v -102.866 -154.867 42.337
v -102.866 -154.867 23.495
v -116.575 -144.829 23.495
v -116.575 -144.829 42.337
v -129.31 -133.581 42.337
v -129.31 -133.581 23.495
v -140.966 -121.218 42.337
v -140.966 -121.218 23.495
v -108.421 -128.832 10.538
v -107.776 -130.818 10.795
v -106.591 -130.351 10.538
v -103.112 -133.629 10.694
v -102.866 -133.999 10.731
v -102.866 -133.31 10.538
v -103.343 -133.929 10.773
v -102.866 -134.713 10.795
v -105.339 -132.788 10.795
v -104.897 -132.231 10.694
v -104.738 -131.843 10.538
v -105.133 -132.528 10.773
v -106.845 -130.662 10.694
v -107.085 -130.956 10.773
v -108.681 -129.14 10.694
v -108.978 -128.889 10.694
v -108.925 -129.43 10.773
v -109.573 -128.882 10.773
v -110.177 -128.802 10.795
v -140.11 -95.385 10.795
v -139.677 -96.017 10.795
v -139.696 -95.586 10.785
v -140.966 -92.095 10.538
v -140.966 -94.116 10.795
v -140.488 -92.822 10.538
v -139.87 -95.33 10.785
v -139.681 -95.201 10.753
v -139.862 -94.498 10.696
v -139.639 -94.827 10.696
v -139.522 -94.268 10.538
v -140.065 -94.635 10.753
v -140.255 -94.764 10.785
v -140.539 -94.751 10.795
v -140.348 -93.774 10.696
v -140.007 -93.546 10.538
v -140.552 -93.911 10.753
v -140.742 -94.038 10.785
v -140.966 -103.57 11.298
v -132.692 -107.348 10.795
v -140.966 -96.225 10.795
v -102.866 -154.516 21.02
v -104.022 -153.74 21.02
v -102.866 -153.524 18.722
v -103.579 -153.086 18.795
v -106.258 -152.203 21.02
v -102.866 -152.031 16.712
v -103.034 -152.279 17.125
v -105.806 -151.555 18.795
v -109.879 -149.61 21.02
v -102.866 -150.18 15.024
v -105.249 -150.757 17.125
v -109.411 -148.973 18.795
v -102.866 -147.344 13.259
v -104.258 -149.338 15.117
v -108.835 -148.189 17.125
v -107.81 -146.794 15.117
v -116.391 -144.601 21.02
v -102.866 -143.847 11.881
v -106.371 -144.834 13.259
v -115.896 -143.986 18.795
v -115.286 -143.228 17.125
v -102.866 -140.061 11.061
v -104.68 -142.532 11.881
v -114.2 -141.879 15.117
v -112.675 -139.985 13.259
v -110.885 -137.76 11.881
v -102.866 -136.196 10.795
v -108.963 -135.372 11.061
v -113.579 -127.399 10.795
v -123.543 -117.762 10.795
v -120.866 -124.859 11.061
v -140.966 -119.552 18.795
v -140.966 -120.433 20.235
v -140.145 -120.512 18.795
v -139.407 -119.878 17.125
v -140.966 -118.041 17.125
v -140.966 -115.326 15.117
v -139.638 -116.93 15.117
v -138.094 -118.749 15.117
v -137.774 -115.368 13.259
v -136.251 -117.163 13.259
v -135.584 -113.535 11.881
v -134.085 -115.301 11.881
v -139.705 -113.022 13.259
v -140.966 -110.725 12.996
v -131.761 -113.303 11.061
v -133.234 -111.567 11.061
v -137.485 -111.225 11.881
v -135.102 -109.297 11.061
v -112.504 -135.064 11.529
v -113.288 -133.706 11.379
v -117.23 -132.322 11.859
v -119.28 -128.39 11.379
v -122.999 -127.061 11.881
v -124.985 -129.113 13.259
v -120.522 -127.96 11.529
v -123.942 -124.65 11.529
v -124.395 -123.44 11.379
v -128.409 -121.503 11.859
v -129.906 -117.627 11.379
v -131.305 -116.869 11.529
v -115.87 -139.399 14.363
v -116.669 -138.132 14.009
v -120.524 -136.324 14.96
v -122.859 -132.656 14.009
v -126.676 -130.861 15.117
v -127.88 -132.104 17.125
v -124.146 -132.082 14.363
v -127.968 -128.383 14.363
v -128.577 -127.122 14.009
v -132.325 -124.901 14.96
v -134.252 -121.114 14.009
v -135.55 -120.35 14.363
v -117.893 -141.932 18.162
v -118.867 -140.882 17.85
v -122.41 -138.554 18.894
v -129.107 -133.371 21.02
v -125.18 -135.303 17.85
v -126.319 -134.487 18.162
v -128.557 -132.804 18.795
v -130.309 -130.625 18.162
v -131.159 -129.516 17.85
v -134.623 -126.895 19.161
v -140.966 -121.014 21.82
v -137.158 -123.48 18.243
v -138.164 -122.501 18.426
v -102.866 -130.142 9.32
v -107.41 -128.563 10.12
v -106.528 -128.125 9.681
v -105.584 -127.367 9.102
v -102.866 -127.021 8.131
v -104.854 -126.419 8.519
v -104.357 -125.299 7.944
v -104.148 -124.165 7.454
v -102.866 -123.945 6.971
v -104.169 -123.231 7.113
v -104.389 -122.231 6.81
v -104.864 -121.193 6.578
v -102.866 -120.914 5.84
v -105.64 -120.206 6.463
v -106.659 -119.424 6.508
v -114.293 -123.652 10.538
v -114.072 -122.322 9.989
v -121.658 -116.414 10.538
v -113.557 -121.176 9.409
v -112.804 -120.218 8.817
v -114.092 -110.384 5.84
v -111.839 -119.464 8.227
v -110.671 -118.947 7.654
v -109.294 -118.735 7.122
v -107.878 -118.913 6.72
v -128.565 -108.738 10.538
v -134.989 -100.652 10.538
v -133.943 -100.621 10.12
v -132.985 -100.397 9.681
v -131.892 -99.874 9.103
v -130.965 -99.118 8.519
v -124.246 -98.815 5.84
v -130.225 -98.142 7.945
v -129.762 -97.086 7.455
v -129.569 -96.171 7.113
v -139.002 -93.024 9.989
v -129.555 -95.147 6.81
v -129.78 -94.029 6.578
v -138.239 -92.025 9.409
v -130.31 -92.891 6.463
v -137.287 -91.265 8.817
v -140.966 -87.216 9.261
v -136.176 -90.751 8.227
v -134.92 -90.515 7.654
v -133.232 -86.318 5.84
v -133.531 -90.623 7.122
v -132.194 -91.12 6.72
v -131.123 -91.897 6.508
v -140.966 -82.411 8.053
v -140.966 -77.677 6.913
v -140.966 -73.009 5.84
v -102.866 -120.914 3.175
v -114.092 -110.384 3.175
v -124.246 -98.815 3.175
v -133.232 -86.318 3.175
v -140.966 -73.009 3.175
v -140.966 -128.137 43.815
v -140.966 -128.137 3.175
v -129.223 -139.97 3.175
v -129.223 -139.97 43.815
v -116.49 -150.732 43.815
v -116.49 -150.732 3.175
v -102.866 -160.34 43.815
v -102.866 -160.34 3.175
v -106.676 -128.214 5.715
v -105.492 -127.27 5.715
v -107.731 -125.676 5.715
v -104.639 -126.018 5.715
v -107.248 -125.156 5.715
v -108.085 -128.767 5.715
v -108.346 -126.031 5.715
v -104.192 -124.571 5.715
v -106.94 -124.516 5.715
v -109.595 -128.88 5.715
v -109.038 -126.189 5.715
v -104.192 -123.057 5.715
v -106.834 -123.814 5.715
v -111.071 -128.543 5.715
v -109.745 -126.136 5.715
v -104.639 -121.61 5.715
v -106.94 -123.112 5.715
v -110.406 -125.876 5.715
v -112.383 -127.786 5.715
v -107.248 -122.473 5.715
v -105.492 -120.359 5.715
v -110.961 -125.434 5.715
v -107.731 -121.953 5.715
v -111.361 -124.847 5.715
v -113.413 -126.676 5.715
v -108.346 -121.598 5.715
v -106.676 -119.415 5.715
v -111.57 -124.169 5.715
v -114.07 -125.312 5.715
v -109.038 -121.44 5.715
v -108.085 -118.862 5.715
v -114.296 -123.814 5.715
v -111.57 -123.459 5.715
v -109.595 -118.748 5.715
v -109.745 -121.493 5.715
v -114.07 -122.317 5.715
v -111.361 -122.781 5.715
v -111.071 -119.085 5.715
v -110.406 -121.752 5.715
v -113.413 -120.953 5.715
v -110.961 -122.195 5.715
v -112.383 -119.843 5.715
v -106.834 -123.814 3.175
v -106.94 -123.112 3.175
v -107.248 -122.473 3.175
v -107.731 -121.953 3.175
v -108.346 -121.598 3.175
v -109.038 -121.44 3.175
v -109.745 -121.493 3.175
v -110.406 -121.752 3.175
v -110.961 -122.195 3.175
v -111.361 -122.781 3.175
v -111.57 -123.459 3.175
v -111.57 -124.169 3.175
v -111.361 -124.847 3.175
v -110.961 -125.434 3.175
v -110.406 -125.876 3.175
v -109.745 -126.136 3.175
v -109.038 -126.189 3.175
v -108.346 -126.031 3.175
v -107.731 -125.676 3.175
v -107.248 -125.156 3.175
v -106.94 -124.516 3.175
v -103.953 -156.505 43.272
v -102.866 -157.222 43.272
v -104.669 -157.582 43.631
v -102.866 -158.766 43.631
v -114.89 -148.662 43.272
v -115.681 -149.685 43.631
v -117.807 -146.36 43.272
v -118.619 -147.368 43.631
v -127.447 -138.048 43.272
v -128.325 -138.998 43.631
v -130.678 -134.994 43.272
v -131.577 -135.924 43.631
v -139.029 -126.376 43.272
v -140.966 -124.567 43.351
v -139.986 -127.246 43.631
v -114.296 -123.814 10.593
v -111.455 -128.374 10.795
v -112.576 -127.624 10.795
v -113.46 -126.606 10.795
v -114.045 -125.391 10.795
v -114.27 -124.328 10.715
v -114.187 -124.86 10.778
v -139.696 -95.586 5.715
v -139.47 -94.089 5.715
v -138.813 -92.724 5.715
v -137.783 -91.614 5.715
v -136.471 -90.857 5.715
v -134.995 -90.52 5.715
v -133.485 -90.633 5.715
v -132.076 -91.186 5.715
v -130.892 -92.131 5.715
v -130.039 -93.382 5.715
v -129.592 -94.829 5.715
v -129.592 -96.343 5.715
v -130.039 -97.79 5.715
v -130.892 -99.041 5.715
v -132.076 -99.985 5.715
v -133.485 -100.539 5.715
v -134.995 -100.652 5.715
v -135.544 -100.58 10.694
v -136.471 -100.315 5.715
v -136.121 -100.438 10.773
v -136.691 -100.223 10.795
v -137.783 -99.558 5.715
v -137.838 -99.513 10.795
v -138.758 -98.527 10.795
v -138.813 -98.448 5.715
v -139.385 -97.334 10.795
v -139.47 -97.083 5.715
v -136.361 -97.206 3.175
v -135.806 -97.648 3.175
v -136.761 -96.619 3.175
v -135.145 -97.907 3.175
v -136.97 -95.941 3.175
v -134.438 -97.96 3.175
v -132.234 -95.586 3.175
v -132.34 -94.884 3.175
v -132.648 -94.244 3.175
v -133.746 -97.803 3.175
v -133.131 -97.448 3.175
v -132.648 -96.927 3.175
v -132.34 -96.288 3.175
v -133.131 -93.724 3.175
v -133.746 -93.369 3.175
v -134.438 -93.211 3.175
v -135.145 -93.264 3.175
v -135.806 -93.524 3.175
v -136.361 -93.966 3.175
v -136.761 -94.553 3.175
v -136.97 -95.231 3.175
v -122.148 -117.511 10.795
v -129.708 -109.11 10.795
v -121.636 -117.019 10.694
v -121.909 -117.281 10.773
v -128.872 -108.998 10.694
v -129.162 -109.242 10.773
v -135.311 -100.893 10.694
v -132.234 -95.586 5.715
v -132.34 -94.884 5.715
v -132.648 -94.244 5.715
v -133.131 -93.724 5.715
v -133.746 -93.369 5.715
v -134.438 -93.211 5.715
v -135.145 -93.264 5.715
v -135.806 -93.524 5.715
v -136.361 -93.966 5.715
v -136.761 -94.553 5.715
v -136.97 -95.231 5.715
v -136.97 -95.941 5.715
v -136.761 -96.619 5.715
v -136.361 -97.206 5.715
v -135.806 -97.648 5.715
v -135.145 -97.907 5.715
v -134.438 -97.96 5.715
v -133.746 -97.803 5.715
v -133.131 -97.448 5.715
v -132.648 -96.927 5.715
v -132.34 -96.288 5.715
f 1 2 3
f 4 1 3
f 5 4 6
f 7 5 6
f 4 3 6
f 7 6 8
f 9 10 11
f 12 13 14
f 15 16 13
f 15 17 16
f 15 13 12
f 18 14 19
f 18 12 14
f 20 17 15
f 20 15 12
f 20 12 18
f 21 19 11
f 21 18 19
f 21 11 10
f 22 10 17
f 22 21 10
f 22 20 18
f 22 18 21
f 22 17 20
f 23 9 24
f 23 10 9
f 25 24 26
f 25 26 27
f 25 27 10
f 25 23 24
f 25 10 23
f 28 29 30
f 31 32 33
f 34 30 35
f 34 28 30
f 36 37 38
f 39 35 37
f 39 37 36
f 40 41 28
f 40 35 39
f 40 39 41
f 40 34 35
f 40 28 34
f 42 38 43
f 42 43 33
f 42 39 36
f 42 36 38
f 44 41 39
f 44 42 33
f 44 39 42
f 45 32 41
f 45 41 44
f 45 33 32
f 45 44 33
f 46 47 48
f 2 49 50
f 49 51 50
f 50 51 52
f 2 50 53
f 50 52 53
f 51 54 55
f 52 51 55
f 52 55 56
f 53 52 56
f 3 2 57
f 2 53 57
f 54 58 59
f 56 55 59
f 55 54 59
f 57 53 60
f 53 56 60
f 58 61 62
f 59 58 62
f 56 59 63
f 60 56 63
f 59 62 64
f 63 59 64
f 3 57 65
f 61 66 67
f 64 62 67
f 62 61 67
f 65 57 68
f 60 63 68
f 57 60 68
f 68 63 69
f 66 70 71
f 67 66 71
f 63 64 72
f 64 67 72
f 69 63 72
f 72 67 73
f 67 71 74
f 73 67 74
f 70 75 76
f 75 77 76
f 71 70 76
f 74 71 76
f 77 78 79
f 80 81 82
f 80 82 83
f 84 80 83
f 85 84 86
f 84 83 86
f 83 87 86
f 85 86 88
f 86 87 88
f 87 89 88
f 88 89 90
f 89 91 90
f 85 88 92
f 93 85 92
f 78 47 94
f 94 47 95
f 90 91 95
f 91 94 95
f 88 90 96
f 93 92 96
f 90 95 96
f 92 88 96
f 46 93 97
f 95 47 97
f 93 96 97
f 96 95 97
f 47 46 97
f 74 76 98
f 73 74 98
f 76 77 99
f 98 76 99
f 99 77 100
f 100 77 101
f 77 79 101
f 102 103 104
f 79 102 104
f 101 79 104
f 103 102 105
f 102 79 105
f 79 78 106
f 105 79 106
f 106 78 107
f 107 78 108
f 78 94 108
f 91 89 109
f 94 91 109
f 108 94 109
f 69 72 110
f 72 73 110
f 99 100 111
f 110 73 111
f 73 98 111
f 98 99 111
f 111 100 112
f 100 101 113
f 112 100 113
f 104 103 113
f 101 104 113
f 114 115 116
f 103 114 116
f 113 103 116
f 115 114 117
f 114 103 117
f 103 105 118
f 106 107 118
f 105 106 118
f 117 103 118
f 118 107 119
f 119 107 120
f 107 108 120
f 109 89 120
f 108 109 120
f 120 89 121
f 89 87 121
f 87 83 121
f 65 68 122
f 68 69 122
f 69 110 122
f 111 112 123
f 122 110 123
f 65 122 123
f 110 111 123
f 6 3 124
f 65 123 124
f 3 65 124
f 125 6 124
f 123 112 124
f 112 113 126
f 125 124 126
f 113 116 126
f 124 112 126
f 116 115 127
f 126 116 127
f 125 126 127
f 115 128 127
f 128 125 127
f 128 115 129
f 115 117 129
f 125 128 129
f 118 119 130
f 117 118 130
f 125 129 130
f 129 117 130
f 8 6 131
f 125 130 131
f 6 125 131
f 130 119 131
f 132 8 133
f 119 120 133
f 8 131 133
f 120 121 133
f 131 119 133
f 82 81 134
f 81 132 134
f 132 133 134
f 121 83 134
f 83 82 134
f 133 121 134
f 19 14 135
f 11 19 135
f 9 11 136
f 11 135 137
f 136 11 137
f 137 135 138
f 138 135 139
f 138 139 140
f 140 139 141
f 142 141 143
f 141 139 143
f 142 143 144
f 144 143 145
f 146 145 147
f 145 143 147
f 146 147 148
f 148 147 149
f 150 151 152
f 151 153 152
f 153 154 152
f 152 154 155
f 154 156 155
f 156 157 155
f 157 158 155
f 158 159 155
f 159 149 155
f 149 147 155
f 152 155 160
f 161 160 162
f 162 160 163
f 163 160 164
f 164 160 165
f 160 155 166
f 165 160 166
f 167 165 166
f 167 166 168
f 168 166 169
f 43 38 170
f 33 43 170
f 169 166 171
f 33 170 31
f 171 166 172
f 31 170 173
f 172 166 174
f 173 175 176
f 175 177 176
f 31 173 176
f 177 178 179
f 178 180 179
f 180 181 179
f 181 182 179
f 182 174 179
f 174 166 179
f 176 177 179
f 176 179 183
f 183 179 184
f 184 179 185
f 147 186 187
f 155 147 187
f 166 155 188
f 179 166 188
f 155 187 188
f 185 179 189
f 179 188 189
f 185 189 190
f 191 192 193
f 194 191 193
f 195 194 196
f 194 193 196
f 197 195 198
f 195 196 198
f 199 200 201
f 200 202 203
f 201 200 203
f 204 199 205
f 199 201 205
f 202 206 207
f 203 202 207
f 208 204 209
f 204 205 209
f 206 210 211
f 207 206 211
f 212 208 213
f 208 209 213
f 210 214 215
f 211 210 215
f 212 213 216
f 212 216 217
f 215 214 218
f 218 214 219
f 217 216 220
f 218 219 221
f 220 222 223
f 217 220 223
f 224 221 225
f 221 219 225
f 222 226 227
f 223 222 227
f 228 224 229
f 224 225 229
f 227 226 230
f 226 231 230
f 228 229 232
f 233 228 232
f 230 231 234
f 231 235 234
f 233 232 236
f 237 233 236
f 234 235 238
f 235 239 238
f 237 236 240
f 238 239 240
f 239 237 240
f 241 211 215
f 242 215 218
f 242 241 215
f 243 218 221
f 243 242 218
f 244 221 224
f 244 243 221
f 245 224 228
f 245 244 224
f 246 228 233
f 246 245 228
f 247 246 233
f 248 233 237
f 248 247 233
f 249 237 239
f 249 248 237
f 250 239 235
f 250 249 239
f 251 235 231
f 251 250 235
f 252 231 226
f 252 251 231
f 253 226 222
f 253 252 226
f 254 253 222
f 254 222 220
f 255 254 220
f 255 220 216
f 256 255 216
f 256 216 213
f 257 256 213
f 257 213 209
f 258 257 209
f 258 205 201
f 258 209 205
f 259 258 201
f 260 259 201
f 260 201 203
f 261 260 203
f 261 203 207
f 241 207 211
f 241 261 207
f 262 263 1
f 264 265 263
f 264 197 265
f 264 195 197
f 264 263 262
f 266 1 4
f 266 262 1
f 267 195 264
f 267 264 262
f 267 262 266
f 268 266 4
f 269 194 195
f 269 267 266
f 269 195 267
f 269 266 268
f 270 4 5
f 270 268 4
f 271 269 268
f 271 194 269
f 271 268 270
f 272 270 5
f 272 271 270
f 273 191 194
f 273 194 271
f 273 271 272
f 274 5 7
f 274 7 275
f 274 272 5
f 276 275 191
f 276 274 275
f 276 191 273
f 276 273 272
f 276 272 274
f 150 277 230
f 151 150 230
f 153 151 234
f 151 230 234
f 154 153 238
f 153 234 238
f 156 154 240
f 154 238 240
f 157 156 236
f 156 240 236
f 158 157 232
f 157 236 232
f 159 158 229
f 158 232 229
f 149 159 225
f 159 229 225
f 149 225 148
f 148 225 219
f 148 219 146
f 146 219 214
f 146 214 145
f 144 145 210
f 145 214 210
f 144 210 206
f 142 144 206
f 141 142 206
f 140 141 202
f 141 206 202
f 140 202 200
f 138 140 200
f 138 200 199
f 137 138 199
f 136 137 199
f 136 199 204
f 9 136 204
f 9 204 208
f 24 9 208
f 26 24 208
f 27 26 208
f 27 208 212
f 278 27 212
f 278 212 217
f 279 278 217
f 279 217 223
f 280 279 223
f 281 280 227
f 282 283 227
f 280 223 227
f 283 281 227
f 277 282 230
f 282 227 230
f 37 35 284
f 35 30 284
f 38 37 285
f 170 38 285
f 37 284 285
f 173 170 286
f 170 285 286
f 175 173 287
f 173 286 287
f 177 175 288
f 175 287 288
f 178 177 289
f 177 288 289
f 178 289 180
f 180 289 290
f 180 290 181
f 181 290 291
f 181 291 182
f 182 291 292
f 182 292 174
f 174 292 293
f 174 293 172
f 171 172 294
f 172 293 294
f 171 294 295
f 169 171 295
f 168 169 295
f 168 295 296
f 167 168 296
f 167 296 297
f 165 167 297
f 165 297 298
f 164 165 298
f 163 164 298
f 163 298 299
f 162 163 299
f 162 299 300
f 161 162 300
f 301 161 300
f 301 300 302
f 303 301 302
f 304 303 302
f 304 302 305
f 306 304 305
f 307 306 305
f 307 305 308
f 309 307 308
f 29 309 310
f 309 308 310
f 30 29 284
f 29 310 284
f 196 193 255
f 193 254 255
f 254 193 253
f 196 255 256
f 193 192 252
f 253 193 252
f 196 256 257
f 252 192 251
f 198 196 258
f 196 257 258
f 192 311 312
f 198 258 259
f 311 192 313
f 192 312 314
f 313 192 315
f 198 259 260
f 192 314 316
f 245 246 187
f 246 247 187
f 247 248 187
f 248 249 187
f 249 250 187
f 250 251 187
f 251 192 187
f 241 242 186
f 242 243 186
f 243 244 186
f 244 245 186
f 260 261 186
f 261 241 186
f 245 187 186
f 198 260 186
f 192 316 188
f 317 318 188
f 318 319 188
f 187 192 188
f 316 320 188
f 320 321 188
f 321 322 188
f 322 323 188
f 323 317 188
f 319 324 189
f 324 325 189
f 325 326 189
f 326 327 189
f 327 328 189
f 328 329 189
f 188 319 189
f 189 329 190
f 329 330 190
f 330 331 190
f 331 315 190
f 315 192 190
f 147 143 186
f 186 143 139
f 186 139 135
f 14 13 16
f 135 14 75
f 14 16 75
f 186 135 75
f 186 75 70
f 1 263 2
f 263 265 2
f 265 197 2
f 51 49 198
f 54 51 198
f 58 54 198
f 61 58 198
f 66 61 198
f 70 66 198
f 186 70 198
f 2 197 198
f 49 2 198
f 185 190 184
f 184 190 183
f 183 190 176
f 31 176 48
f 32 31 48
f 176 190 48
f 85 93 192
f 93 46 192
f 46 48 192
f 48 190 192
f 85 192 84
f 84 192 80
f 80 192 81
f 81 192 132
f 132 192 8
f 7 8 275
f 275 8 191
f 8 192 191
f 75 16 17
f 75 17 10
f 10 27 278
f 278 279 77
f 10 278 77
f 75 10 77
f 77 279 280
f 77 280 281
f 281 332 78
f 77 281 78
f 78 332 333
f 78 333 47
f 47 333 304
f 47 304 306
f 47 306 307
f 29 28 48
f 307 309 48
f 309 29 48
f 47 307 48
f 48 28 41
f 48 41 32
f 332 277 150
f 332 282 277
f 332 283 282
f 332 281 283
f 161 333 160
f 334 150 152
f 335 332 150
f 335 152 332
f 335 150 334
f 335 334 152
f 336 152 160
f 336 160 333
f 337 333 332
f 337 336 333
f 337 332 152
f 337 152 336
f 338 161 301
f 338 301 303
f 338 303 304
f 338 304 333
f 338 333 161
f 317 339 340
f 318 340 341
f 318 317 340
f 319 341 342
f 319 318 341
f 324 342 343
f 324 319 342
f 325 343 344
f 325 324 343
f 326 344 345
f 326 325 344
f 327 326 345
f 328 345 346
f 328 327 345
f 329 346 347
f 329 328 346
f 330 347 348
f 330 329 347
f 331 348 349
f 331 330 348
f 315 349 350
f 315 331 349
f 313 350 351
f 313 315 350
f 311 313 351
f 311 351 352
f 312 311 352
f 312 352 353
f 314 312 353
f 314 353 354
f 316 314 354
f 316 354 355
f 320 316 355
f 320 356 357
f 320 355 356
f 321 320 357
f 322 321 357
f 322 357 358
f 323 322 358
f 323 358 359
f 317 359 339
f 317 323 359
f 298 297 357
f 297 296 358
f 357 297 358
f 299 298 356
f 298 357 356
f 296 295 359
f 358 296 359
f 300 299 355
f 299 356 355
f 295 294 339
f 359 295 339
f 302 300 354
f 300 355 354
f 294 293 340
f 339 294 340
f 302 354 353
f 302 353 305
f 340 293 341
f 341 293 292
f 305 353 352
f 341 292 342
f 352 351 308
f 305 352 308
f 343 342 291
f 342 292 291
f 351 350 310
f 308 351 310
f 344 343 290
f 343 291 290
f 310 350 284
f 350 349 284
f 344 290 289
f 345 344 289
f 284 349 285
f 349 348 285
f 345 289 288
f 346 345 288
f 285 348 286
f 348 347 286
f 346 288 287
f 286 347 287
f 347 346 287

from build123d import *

# Parameters (mm, degrees)
SKETCH1_R               = 2.38125
BOSS_EXTRUDE1_DEPTH     = 3.175
BOSS_EXTRUDE2_DEPTH     = 50.8
CUT_EXTRUDE1_DEPTH      = 209.526843613
CUT_EXTRUDE1_DEPTH_BACK = 209.526843613
SKETCH3_R               = 203.829254644
SKETCH3_R_2             = 174.625
SKETCH5_R               = 2.38125
CUT_EXTRUDE3_DEPTH      = 200.484174202
SKETCH6_W               = 205.731089426
SKETCH6_H               = 25.4
BOSS_EXTRUDE3_DEPTH     = 3.175
SKETCH8_R               = 2.38125
CUT_EXTRUDE5_DEPTH      = 200.484174202
SKETCH9_W               = 205.731089426
SKETCH9_H               = 38.1
BOSS_EXTRUDE4_DEPTH     = 3.175
SKETCH10_R              = 6.35
SKETCH10_R_2            = 2.38125
CUT_EXTRUDE6_DEPTH      = 200.484174202
SKETCH11_W              = 53.331089426
SKETCH11_H              = 31.75
BOSS_EXTRUDE5_DEPTH     = 3.175
FILLET1_R               = 10.16
SKETCH12_R              = 6.35
SKETCH12_R_2            = 2.38125
CUT_EXTRUDE7_DEPTH      = 200.484174202
FILLET2_R               = 2.54
CUT_EXTRUDE8_DEPTH      = 200.484174202
SKETCH14_W              = 2.759281453
SKETCH14_H              = 7.963584416
SKETCH14_W_2            = 2.527010149
SKETCH14_H_2            = 5.938870156
BOSS_EXTRUDE6_DEPTH     = 3.175
FILLET3_R               = 2.54
SKETCH15_R              = 2.38125
BOSS_EXTRUDE7_DEPTH     = 40.64
SKETCH16_R              = 227.754671792
SKETCH16_W              = 368.539826918
SKETCH16_H              = 147.114866813
CUT_EXTRUDE9_DEPTH      = 218.328838711
SKETCH17_R              = 87.195519402
CUT_EXTRUDE10_DEPTH     = 218.328838646
CHAMFER1_SIZE           = 27.94
CHAMFER1_SIZE_2         = 31.030513664
CUT_EXTRUDE12_START     = -2.54
SKETCH18_R              = 5.08
CUT_EXTRUDE12_DEPTH     = 33.02
FILLET4_R               = 10.16
CUT_EXTRUDE13_START     = -7.62
SKETCH20_R              = 185.916878671
CUT_EXTRUDE13_DEPTH     = 210.708838803
FILLET5_SIZE            = 12.7
FILLET5_SIZE_2          = 15.24
CHAMFER2_SIZE           = 10.16
CHAMFER2_SIZE_2         = 4.9553631
FILLET6_R               = 2.54


with BuildPart() as part:
    # Sketch1 → Boss-Extrude1 (new body)
    with BuildSketch(Plane.XY):
        with BuildLine():
            Line((-102.865544713, 31.75), (-102.865544713, 145.022480019))
            ThreePointArc((-102.865544713, 145.022480019), (-123.286100955, 128.114703728), (-140.965544713, 108.358457002))
            Line((-140.965544713, 108.358457002), (-140.965544713, -108.358457002))
            ThreePointArc((-140.965544713, -108.358457002), (-123.286100955, -128.114703728), (-102.865544713, -145.022480019))
            Line((-102.865544713, -145.022480019), (-102.865544713, -69.85))
            Line((-102.865544713, -69.85), (102.865544713, -69.85))
            Line((102.865544713, -69.85), (102.865544713, -145.022480019))
            ThreePointArc((102.865544713, -145.022480019), (123.286100955, -128.114703728), (140.965544713, -108.358457002))
            Line((140.965544713, -108.358457002), (140.965544713, 108.358457002))
            ThreePointArc((140.965544713, 108.358457002), (123.286100955, 128.114703728), (102.865544713, 145.022480019))
            Line((102.865544713, 145.022480019), (102.865544713, 31.75))
            Line((102.865544713, 31.75), (-102.865544713, 31.75))
        make_face()
        with Locations((25.4, -38.1)):
            Circle(SKETCH1_R, mode=Mode.SUBTRACT)
        with Locations((-25.4, -38.1)):
            Circle(SKETCH1_R, mode=Mode.SUBTRACT)
        with Locations((0, -38.1)):
            Circle(SKETCH1_R, mode=Mode.SUBTRACT)
    extrude(amount=BOSS_EXTRUDE1_DEPTH)

    # Sketch2 → Boss-Extrude2 (add)
    with BuildSketch(Plane.XY.offset(3.175)):
        with BuildLine():
            ThreePointArc((-102.865544713, -141.111907137), (-123.390730203, -123.566250752), (-140.965544713, -103.06602655))
            Line((-140.965544713, -103.06602655), (-140.965544713, -108.358457002))
            ThreePointArc((-140.965544713, -108.358457002), (-123.286100955, -128.114703728), (-102.865544713, -145.022480019))
            Line((-102.865544713, -145.022480019), (-102.865544713, -141.111907137))
        make_face()
        with BuildLine():
            ThreePointArc((140.965544713, -103.06602655), (123.390730203, -123.566250752), (102.865544713, -141.111907137))
            Line((102.865544713, -141.111907137), (102.865544713, -145.022480019))
            ThreePointArc((102.865544713, -145.022480019), (123.286100955, -128.114703728), (140.965544713, -108.358457002))
            Line((140.965544713, -108.358457002), (140.965544713, -103.06602655))
        make_face()
    extrude(amount=BOSS_EXTRUDE2_DEPTH)

    # Sketch3 → Cut-Extrude1 (cut, two sides: drawn at the far end of the back side and taken through both)
    with BuildSketch(Plane.XY.offset(3.175).offset(-CUT_EXTRUDE1_DEPTH_BACK)):
        Circle(SKETCH3_R)
        Circle(SKETCH3_R_2, mode=Mode.SUBTRACT)
    extrude(amount=CUT_EXTRUDE1_DEPTH + CUT_EXTRUDE1_DEPTH_BACK, mode=Mode.SUBTRACT)

    # Sketch5 → Cut-Extrude3 (cut, through all)
    with BuildSketch(Plane.XY.offset(3.175)):
        with Locations((134.615544713, -95.585904409)):
            Circle(SKETCH5_R)
        with Locations((109.215544713, -123.814275401)):
            Circle(SKETCH5_R)
        with Locations(Location((-134.615544713, -95.585904409, 0), (0, 0, 180))):
            Circle(SKETCH5_R)
        with Locations(Location((-109.215544713, -123.814275401, 0), (0, 0, 180))):
            Circle(SKETCH5_R)
    extrude(amount=-CUT_EXTRUDE3_DEPTH, mode=Mode.SUBTRACT)

    # Sketch6 → Boss-Extrude3 (add)
    with BuildSketch(Plane.XY.offset(3.175)):
        with Locations((0, 77.611907137)):
            Rectangle(SKETCH6_W, SKETCH6_H)
    extrude(amount=-BOSS_EXTRUDE3_DEPTH)

    # Sketch8 → Cut-Extrude5 (cut, through all)
    with BuildSketch(Plane.XY.offset(3.175)):
        with Locations((-38.1, -38.1)):
            Circle(SKETCH8_R)
        with Locations((-50.8, -38.1)):
            Circle(SKETCH8_R)
        with Locations((12.7, -38.1)):
            Circle(SKETCH8_R)
        with Locations((-12.7, -38.1)):
            Circle(SKETCH8_R)
    extrude(amount=-CUT_EXTRUDE5_DEPTH, mode=Mode.SUBTRACT)

    # Sketch9 → Boss-Extrude4 (add)
    with BuildSketch(Plane.XY.offset(3.175)):
        with Locations((0, -88.9)):
            Rectangle(SKETCH9_W, SKETCH9_H)
    extrude(amount=-BOSS_EXTRUDE4_DEPTH)

    # Sketch10 → Cut-Extrude6 (cut, through all)
    with BuildSketch(Plane.XY.offset(3.175)):
        with Locations((0, -76.2)):
            Circle(SKETCH10_R)
        with Locations((-25.4, -76.2)):
            Circle(SKETCH10_R_2)
        with Locations((-38.1, -76.2)):
            Circle(SKETCH10_R_2)
        with Locations((25.4, -76.2)):
            Circle(SKETCH10_R_2)
    extrude(amount=-CUT_EXTRUDE6_DEPTH, mode=Mode.SUBTRACT)

    # Sketch11 → Boss-Extrude5 (add)
    with BuildSketch(Plane.XY.offset(3.175)):
        with Locations((0, -123.825)):
            Rectangle(SKETCH11_W, SKETCH11_H)
    extrude(amount=-BOSS_EXTRUDE5_DEPTH)

    # Fillet1
    fillet1_edges = [part.edges().sort_by_distance(p)[0] for p in [
        (-26.665544713, -139.7, 1.5875),
        (-26.665544713, -107.95, 1.5875),
        (26.665544713, -107.95, 1.5875),
        (26.665544713, -139.7, 1.5875),
    ]]
    fillet(fillet1_edges, radius=FILLET1_R)

    # Sketch12 → Cut-Extrude7 (cut, through all)
    with BuildSketch(Plane.XY.offset(3.175)):
        with Locations((-25.4, -76.2)):
            Circle(SKETCH12_R)
        with Locations((25.4, -76.2)):
            Circle(SKETCH12_R)
        with Locations((-8.66775, -67.53225)):
            Circle(SKETCH12_R_2)
        with Locations((8.66775, -67.53225)):
            Circle(SKETCH12_R_2)
        with Locations((8.66775, -84.86775)):
            Circle(SKETCH12_R_2)
        with Locations((-8.66775, -84.86775)):
            Circle(SKETCH12_R_2)
    extrude(amount=-CUT_EXTRUDE7_DEPTH, mode=Mode.SUBTRACT)

    # Fillet2
    fillet2_edges = [part.edges().sort_by_distance(p)[0] for p in [
        (-102.865544713, 141.111907137, 1.5875),
        (102.865544713, 141.111907137, 1.5875),
    ]]
    fillet(fillet2_edges, radius=FILLET2_R)

    # Sketch13 → Cut-Extrude8 (cut, through all)
    # profile 1 of 4: a face of its own
    with BuildSketch(Plane.XY.offset(3.175)):
        with BuildLine():
            Line((-29.807958333, -15.810565048), (-38.216416667, -15.810565048))
            Line((-38.216416667, -15.810565048), (-33.538583333, 6.245101619))
            Line((-33.538583333, 6.245101619), (-38.803791667, 6.245101619))
            Line((-38.803791667, 6.245101619), (-39.682208333, 2.075268285))
            Line((-39.682208333, 2.075268285), (-48.095958333, 2.075268285))
            Line((-48.095958333, 2.075268285), (-47.397458333, 5.477809952))
            add(Edge.make_bspline(
                [(-47.397458333, 5.477809952), (-47.320569058, 5.758194134), (-47.170922216, 6.303895823), (-46.789013651, 7.053374007), (-46.29771223, 7.715065901), (-45.690436731, 8.272796577), (-45.006500067, 8.730292102), (-44.253147871, 9.054960677), (-43.448405111, 9.260244914), (-42.891974442, 9.282012228), (-42.6085, 9.293101619)],
                knots=[0, 0, 0, 0, 1.050168006, 2.043904372, 3.024673376, 4.01863537, 5.013909092, 5.989008141, 6.975497172, 8, 8, 8, 8], degree=3))
            Line((-42.6085, 9.293101619), (-24.463375, 9.293101619))
            Line((-24.463375, 9.293101619), (-29.807958333, -15.810565048))
        make_face()
    # profile 2 of 4: a face of its own
    with BuildSketch(Plane.XY.offset(3.175)):
        with BuildLine():
            add(Edge.make_bspline(
                [(-3.566583333, -12.132856715), (-3.643765668, -12.421811436), (-3.79437451, -12.985659844), (-4.17293599, -13.764550451), (-4.665381385, -14.453577746), (-5.270434906, -15.036263062), (-5.950809803, -15.518035961), (-6.703009887, -15.859816489), (-7.511777843, -16.068702787), (-8.070292693, -16.093985699), (-8.355541667, -16.106898381)],
                knots=[0, 0, 0, 0, 1.062369753, 2.073042759, 3.062499936, 4.061251344, 5.048575831, 6.014824268, 6.986115874, 8, 8, 8, 8], degree=3))
            Line((-8.355541667, -16.106898381), (-22.547791667, -16.106898381))
            add(Edge.make_bspline(
                [(-22.547791667, -16.106898381), (-22.69262218, -16.104596964), (-22.972752339, -16.100145578), (-23.378206431, -16.044702396), (-23.755568174, -15.960682303), (-24.107157142, -15.846746121), (-24.426210233, -15.691540895), (-24.716954418, -15.504453058), (-24.976786635, -15.281711317), (-25.203806964, -15.025677099), (-25.40308213, -14.746169713), (-25.554358436, -14.435544628), (-25.674211179, -14.106195373), (-25.74344938, -13.752832717), (-25.791514529, -13.37950469), (-25.77975916, -12.981941289), (-25.73922686, -12.562383844), (-25.682974686, -12.278883611), (-25.654, -12.132856715)],
                knots=[0, 0, 0, 0, 1.158779845, 2.241303809, 3.269110906, 4.251580925, 5.192683609, 6.101443689, 7.012833415, 7.922909267, 8.835720222, 9.751475912, 10.680528402, 11.633319635, 12.628295421, 13.687540584, 14.808885378, 16, 16, 16, 16], degree=3))
            Line((-25.654, -12.132856715), (-21.997458333, 5.319059952))
            add(Edge.make_bspline(
                [(-21.997458333, 5.319059952), (-21.920272116, 5.608009048), (-21.769655695, 6.171846477), (-21.391148554, 6.950815808), (-20.898502375, 7.639552216), (-20.293153244, 8.224337096), (-19.608609326, 8.702683082), (-18.855913228, 9.046275843), (-18.048644228, 9.254382857), (-17.4919553, 9.28003834), (-17.2085, 9.293101619)],
                knots=[0, 0, 0, 0, 1.062516124, 2.073328378, 3.062921881, 4.061810895, 5.05442655, 6.020808115, 6.992233544, 8, 8, 8, 8], degree=3))
            Line((-17.2085, 9.293101619), (-3.01625, 9.293101619))
            add(Edge.make_bspline(
                [(-3.01625, 9.293101619), (-2.871419505, 9.290800192), (-2.591289383, 9.286348788), (-2.185835038, 9.230905733), (-1.808474182, 9.146885197), (-1.456882118, 9.03295056), (-1.137839887, 8.877739913), (-0.847056821, 8.690671483), (-0.587369032, 8.467857656), (-0.359809395, 8.212092615), (-0.16209325, 7.930921186), (-0.002983257, 7.623293687), (0.114459046, 7.2921344), (0.187047795, 6.939473562), (0.223589985, 6.565305639), (0.223678302, 6.168188246), (0.179743785, 5.748571863), (0.123975462, 5.465081675), (0.09525, 5.319059952)],
                knots=[0, 0, 0, 0, 1.158432062, 2.24063113, 3.268129752, 4.250304904, 5.191125136, 6.099612471, 7.010728663, 7.920531375, 8.833068369, 9.75494936, 10.683723015, 11.636228288, 12.62940148, 13.688234619, 14.809242866, 16, 16, 16, 16], degree=3))
            Line((0.09525, 5.319059952), (-3.566583333, -12.132856715))
        make_face()
        Polygon((-13.403791667, 6.245101619), (-17.425458333, -13.058898381), (-12.16025, -13.058898381), (-8.138583333, 6.245101619), align=None, mode=Mode.SUBTRACT)
    # profile 3 of 4: a face of its own
    with BuildSketch(Plane.XY.offset(3.175)):
        with BuildLine():
            Line((11.557, 9.293101619), (8.556625, -5.269565048))
            Line((8.556625, -5.269565048), (13.827125, -5.269565048))
            Line((13.827125, -5.269565048), (16.8275, 9.293101619))
            Line((16.8275, 9.293101619), (25.235958333, 9.293101619))
            Line((25.235958333, 9.293101619), (19.896666667, -16.106898381))
            Line((19.896666667, -16.106898381), (11.482916667, -16.106898381))
            Line((11.482916667, -16.106898381), (13.165666667, -8.317565048))
            Line((13.165666667, -8.317565048), (3.439583333, -8.317565048))
            add(Edge.make_bspline(
                [(3.439583333, -8.317565048), (3.294736233, -8.315312365), (3.014573993, -8.310955241), (2.609344629, -8.25485176), (2.230636814, -8.173029355), (1.881290806, -8.050712181), (1.561052368, -7.897312045), (1.270346477, -7.709804396), (1.009103929, -7.48515858), (0.777806767, -7.227358437), (0.580756638, -6.941550122), (0.426179112, -6.6292081), (0.309007624, -6.297036788), (0.237889907, -5.94070984), (0.190785312, -5.563660832), (0.202000265, -5.162620664), (0.243321079, -4.739613917), (0.29915982, -4.45427987), (0.328083333, -4.306481715)],
                knots=[0, 0, 0, 0, 1.152191709, 2.228561082, 3.250524676, 4.231939746, 5.167691878, 6.071285285, 6.977493388, 7.902223819, 8.821393841, 9.731943086, 10.66895861, 11.616332835, 12.619603957, 13.686867372, 14.801836863, 16, 16, 16, 16], degree=3))
            Line((0.328083333, -4.306481715), (3.14325, 9.293101619))
            Line((3.14325, 9.293101619), (11.557, 9.293101619))
        make_face()
    # profile 4 of 4: a face of its own
    with BuildSketch(Plane.XY.offset(3.175)):
        with BuildLine():
            Line((33.374541667, -13.058898381), (47.0535, -13.058898381))
            Line((47.0535, -13.058898381), (46.392041667, -16.106898381))
            Line((46.392041667, -16.106898381), (24.304625, -16.106898381))
            Line((24.304625, -16.106898381), (25.802166667, -9.143065048))
            add(Edge.make_bspline(
                [(25.802166667, -9.143065048), (25.879273752, -8.861031474), (26.029757165, -8.310610268), (26.410334887, -7.552072135), (26.901419327, -6.879703753), (27.508831265, -6.311820899), (28.191228528, -5.842472815), (28.946271137, -5.513745702), (29.752164487, -5.300517366), (30.311046908, -5.28002739), (30.596416667, -5.269565048)],
                knots=[0, 0, 0, 0, 1.049169808, 2.047576474, 3.031944376, 4.027910562, 5.023553593, 5.994653504, 6.976054309, 8, 8, 8, 8], degree=3))
            Line((30.596416667, -5.269565048), (40.3225, -5.269565048))
            Line((40.3225, -5.269565048), (42.661416667, 6.245101619))
            Line((42.661416667, 6.245101619), (37.396208333, 6.245101619))
            Line((37.396208333, 6.245101619), (36.517791667, 2.075268285))
            Line((36.517791667, 2.075268285), (28.104041667, 2.075268285))
            Line((28.104041667, 2.075268285), (28.802541667, 5.477809952))
            add(Edge.make_bspline(
                [(28.802541667, 5.477809952), (28.879430942, 5.758194134), (29.029077784, 6.303895823), (29.410986349, 7.053374007), (29.90228777, 7.715065901), (30.509563269, 8.272796577), (31.193499933, 8.730292102), (31.946852129, 9.054960677), (32.751594889, 9.260244914), (33.308025558, 9.282012228), (33.5915, 9.293101619)],
                knots=[0, 0, 0, 0, 1.050168006, 2.043904372, 3.024673376, 4.01863537, 5.013909092, 5.989008141, 6.975497172, 8, 8, 8, 8], degree=3))
            Line((33.5915, 9.293101619), (47.78375, 9.293101619))
            add(Edge.make_bspline(
                [(47.78375, 9.293101619), (47.92859726, 9.290849086), (48.208759811, 9.286492252), (48.613987002, 9.230386738), (48.992702458, 9.148571481), (49.342021711, 9.026229282), (49.662353678, 8.87291663), (49.952725098, 8.685096123), (50.214324347, 8.462382804), (50.440285412, 8.20121114), (50.636405741, 7.915869715), (50.798510828, 7.606235104), (50.913345969, 7.272328086), (50.987754572, 6.916671215), (51.023365934, 6.538801464), (51.023963511, 6.138199286), (50.97928388, 5.715135649), (50.923924969, 5.429811378), (50.89525, 5.282018285)],
                knots=[0, 0, 0, 0, 1.152517565, 2.229191352, 3.251443972, 4.233136601, 5.169153376, 6.073002333, 6.979466726, 7.895134038, 8.814564014, 9.731738245, 10.66901877, 11.616660927, 12.618740334, 13.686213184, 14.801498005, 16, 16, 16, 16], degree=3))
            Line((50.89525, 5.282018285), (48.916166667, -4.306481715))
            add(Edge.make_bspline(
                [(48.916166667, -4.306481715), (48.838706266, -4.597052385), (48.687148602, -5.165577869), (48.311448965, -5.952788492), (47.817473721, -6.648200027), (47.212376239, -7.235653604), (46.533647997, -7.724482215), (45.778706123, -8.063324207), (44.971906745, -8.281163221), (44.41262475, -8.30526518), (44.127208333, -8.317565048)],
                knots=[0, 0, 0, 0, 1.06412456, 2.082047477, 3.072647496, 4.071792832, 5.058775816, 6.021176094, 6.990153746, 8, 8, 8, 8], degree=3))
            Line((44.127208333, -8.317565048), (34.395833333, -8.317565048))
            Line((34.395833333, -8.317565048), (33.374541667, -13.058898381))
        make_face()
    extrude(amount=-CUT_EXTRUDE8_DEPTH, mode=Mode.SUBTRACT)


with BuildPart() as cut_extrude8_piece_1:
    # of the separate pieces the step leaves, piece 1, a body of its own (cut_extrude8_pieces)
    add(part.part.solids().sort_by_distance((-106.961346111, 138.033188267, 0))[0])



with BuildPart() as cut_extrude8_piece_2:
    # of the separate pieces the step leaves, piece 2, a body of its own (cut_extrude8_pieces)
    add(part.part.solids().sort_by_distance((-8.138583333, 6.245101619, 0))[0])


with BuildPart() as cut_extrude8_piece_1_1:
    add(cut_extrude8_piece_1.part)

    add(cut_extrude8_piece_2.part)  # Boss-Extrude6 merges Cut-Extrude8 piece 2
    # Sketch14 → Boss-Extrude6 (add)
    with BuildSketch(Plane.XY.offset(3.175)):
        with Locations((-11.017521916, 7.88967512)):
            Rectangle(SKETCH14_W, SKETCH14_H)
        with Locations((-14.795211944, -14.779945163)):
            Rectangle(SKETCH14_W_2, SKETCH14_H_2)
    extrude(amount=-BOSS_EXTRUDE6_DEPTH)

    # Fillet3
    fillet3_edges = [cut_extrude8_piece_1_1.edges().sort_by_distance(p)[0] for p in [
        (102.865544713, 90.311907137, 1.5875),
        (102.865544713, 31.75, 1.5875),
        (-102.865544713, 64.911907137, 1.5875),
        (-102.865544713, 31.75, 1.5875),
        (-102.865544713, 90.311907137, 1.5875),
        (102.865544713, 64.911907137, 1.5875),
    ]]
    fillet(fillet3_edges, radius=FILLET3_R)

    # Sketch15 → Boss-Extrude7 (add)
    # profile 1 of 2: a face of its own
    with BuildSketch(Plane.XY.offset(3.175)):
        with BuildLine():
            ThreePointArc((-102.865544713, -120.914193587), (-124.246259111, -98.815128381), (-140.965544713, -73.008750871))
            Line((-140.965544713, -73.008750871), (-140.965544713, -128.136510034))
            ThreePointArc((-140.965544713, -128.136510034), (-122.97425317, -145.49083496), (-102.865544713, -160.340044003))
            Line((-102.865544713, -160.340044003), (-102.865544713, -120.914193587))
        make_face()
        with Locations((-109.215544713, -123.814275401)):
            Circle(SKETCH15_R, mode=Mode.SUBTRACT)
        with Locations((-134.615544713, -95.585904409)):
            Circle(SKETCH15_R, mode=Mode.SUBTRACT)
    # profile 2 of 2: a face of its own
    with BuildSketch(Plane.XY.offset(3.175)):
        with BuildLine():
            Line((140.965544713, -128.136510034), (140.965544713, -73.008750871))
            ThreePointArc((140.965544713, -73.008750871), (124.246259111, -98.815128381), (102.865544713, -120.914193587))
            Line((102.865544713, -120.914193587), (102.865544713, -160.340044003))
            ThreePointArc((102.865544713, -160.340044003), (122.97425317, -145.49083496), (140.965544713, -128.136510034))
        make_face()
        with Locations((109.215544713, -123.814275401)):
            Circle(SKETCH15_R, mode=Mode.SUBTRACT)
        with Locations((134.615544713, -95.585904409)):
            Circle(SKETCH15_R, mode=Mode.SUBTRACT)
    extrude(amount=BOSS_EXTRUDE7_DEPTH)

    # Sketch16 → Cut-Extrude9 (cut, through all)
    with BuildSketch(Plane.XY.offset(3.175)):
        Circle(SKETCH16_R)
        with Locations((23.411183864, 115.93750226)):
            Rectangle(SKETCH16_W, SKETCH16_H)
    extrude(amount=-CUT_EXTRUDE9_DEPTH, mode=Mode.SUBTRACT)


with BuildPart() as cut_extrude9_piece_1:
    # of the separate pieces the step leaves, piece 1, a body of its own (cut_extrude9_pieces)
    add(cut_extrude8_piece_1_1.part.solids().sort_by_distance((-140.965544713, -128.136510034, 3.175))[0])

    # Chamfer1
    # the kernel refuses this chamfer: 31.030513664, 27.94 mm, written as the material it takes off along each edge
    with BuildSketch(Plane(origin=(0, 0, 43.815), x_dir=(-0.20017923188636447, -0.9797592944807337, 0), z_dir=(0.9797592944807337, -0.20017923188636447, 0))) as chamfer1_piece_1:
        Polygon((158.75 + CHAMFER1_SIZE, 0), (158.75, CHAMFER1_SIZE_2), (158.75, 0), align=None)
    revolve(axis=Axis((0, 0, 43.815), (0, 0, -1)), revolution_arc=79.913485183, mode=Mode.SUBTRACT)

    # Sketch18 → Cut-Extrude12 (cut)
    with BuildSketch(Plane(origin=(0, 0, 3.175), x_dir=(-1, 0, 0), z_dir=(0, 0, -1)).offset(CUT_EXTRUDE12_START)):
        with Locations((134.615544713, -95.585904409)):
            Circle(SKETCH18_R)
        with Locations((109.215544713, -123.814275401)):
            Circle(SKETCH18_R)
    extrude(amount=-CUT_EXTRUDE12_DEPTH, mode=Mode.SUBTRACT)

    # Fillet4
    # the kernel refuses this fillet: 10.16 mm, written as the material it takes off along each edge
    with BuildSketch(Plane(origin=(0, 0, 43.815), x_dir=(-0.4998842027499923, -0.8660922490364434, 0), z_dir=(0.8660922490364434, -0.4998842027499923, 0))) as fillet4_piece_1:
        with BuildLine():
            CenterArc((191.237667396, 10.133185423), FILLET4_R, 222, 43.836372996)
            Line((183.68731597, 3.334818462), (183.536308941, 3.198851123))
            Line((183.536308941, 3.198851123), (186.538992971, -0.135967339))
            Line((186.538992971, -0.135967339), (186.69, -0.2032))
            ThreePointArc((186.69, -0.2032), (188.595, -0.2032), (190.485246652, -0.202663708))
            Line((190.485246652, -0.202663708), (190.5, 0))
        make_face()
    revolve(axis=Axis((0, 0, 43.815), (0, 0, -1)), revolution_arc=22.482929592, mode=Mode.SUBTRACT)

    # Sketch20 → Cut-Extrude13 (cut, through all)
    with BuildSketch(Plane(origin=(0, 0, 3.175), x_dir=(-1, 0, 0), z_dir=(0, 0, -1)).offset(CUT_EXTRUDE13_START)):
        Circle(SKETCH20_R)
    extrude(amount=-CUT_EXTRUDE13_DEPTH, mode=Mode.SUBTRACT)

    # Fillet5
    # an asymmetric fillet: 15.24, 12.7 mm, written as the material it adds along each edge
    with BuildSketch(Plane(origin=(0, 0, 10.795), x_dir=(-0.37219545317255504, -0.9281543754342143, 0), z_dir=(0.9281543754342143, -0.37219545317255504, 0))) as fillet5_piece_1_section:
        with BuildLine():
            Bezier((185.916878671, -FILLET5_SIZE), (185.916878671, 0), (185.916878671 - FILLET5_SIZE_2, 0), weights=[1, 0.707106781, 1])
            Line((185.916878671 - FILLET5_SIZE_2, 0), (185.916878671, 0))
            Line((185.916878671, 0), (185.916878671, -FILLET5_SIZE))
        make_face()
    fillet5_piece_1 = revolve(axis=Axis((0, 0, 10.795), (0, 0, -1)), revolution_arc=39.198065471, mode=Mode.PRIVATE)
    fillet5_piece_1 = split(fillet5_piece_1, bisect_by=Plane(origin=(-140.965544713, -133.970271088, 13.593151192), z_dir=(1, 0, 0)), keep=Keep.TOP, mode=Mode.PRIVATE)
    fillet5_piece_1 = split(fillet5_piece_1, bisect_by=Plane(origin=(-102.865544713, -133.970271088, 13.593151192), z_dir=(-1, 0, 0)), keep=Keep.TOP, mode=Mode.PRIVATE)
    add(fillet5_piece_1)

    # Chamfer2
    # the kernel refuses this chamfer: 10.16, 4.9553631 mm, written as the material it takes off along each edge
    with BuildSketch(Plane(origin=(0, 0, 10.795), x_dir=(-0.5133970128163213, -0.8581512146651533, 0), z_dir=(0.8581512146651533, -0.5133970128163213, 0))) as chamfer2_piece_1:
        Polygon((158.75 + CHAMFER2_SIZE, 0), (158.75, CHAMFER2_SIZE_2), (158.75, 0), align=None)
    revolve(axis=Axis((0, 0, 10.795), (0, 0, -1)), revolution_arc=41.227627295, mode=Mode.SUBTRACT)

    # Fillet6
    # the kernel refuses this fillet: 2.54 mm, written as the material it takes off along each edge
    with BuildSketch(Plane(origin=(0, 0, 10.795), x_dir=(-0.8219286457205435, -0.5695904680943961, 0), z_dir=(0.5695904680943961, -0.8219286457205435, 0))) as fillet6_piece_1:
        with BuildLine():
            CenterArc((168.91 + FILLET6_R * 0.230868191133, FILLET6_R), FILLET6_R, 243.999999999, 26.000000001)
            Line((168.91 - FILLET6_R * 0.207502955669, FILLET6_R * 0.101205953707), (168.91, 0))
            Line((168.91, 0), (168.91 + FILLET6_R * 0.230868191133, 0))
        make_face()
    revolve(axis=Axis((0, 0, 10.795), (0, 0, -1)), revolution_arc=1.789016953, mode=Mode.SUBTRACT)
    with BuildSketch(Plane(origin=(0, 0, 10.795), x_dir=(-0.6020891736925713, -0.7984288490042157, 0), z_dir=(0.7984288490042157, -0.6020891736925713, 0))) as fillet6_piece_2:
        with BuildLine():
            CenterArc((168.91 + FILLET6_R * 0.230868191133, FILLET6_R), FILLET6_R, 243.999999999, 26.000000001)
            Line((168.91 - FILLET6_R * 0.207502955669, FILLET6_R * 0.101205953707), (168.91, 0))
            Line((168.91, 0), (168.91 + FILLET6_R * 0.230868191133, 0))
        make_face()
    revolve(axis=Axis((0, 0, 10.795), (0, 0, -1)), revolution_arc=3.739989845, mode=Mode.SUBTRACT)
    with BuildSketch(Plane(origin=(0, 0, 10.795), x_dir=(-0.6700488357917587, -0.7423170196446452, 0), z_dir=(0.7423170196446452, -0.6700488357917587, 0))) as fillet6_piece_3:
        with BuildLine():
            CenterArc((168.91 + FILLET6_R * 0.230868191133, FILLET6_R), FILLET6_R, 243.999999999, 26.000000001)
            Line((168.91 - FILLET6_R * 0.207502955669, FILLET6_R * 0.101205953707), (168.91, 0))
            Line((168.91, 0), (168.91 + FILLET6_R * 0.230868191133, 0))
        make_face()
    revolve(axis=Axis((0, 0, 10.795), (0, 0, -1)), revolution_arc=11.8963194, mode=Mode.SUBTRACT)


with BuildPart() as cut_extrude9_piece_2:
    # of the separate pieces the step leaves, piece 2, a body of its own (cut_extrude9_pieces)
    add(cut_extrude8_piece_1_1.part.solids().sort_by_distance((140.965544713, -73.008750871, 3.175))[0])

    # Sketch17 → Cut-Extrude10 (cut, through all)
    with BuildSketch(Plane.XY.offset(43.815)):
        with Locations((124.015012721, -121.332950523)):
            Circle(SKETCH17_R)
    extrude(amount=-CUT_EXTRUDE10_DEPTH, mode=Mode.SUBTRACT)


solid = cut_extrude9_piece_1.part
